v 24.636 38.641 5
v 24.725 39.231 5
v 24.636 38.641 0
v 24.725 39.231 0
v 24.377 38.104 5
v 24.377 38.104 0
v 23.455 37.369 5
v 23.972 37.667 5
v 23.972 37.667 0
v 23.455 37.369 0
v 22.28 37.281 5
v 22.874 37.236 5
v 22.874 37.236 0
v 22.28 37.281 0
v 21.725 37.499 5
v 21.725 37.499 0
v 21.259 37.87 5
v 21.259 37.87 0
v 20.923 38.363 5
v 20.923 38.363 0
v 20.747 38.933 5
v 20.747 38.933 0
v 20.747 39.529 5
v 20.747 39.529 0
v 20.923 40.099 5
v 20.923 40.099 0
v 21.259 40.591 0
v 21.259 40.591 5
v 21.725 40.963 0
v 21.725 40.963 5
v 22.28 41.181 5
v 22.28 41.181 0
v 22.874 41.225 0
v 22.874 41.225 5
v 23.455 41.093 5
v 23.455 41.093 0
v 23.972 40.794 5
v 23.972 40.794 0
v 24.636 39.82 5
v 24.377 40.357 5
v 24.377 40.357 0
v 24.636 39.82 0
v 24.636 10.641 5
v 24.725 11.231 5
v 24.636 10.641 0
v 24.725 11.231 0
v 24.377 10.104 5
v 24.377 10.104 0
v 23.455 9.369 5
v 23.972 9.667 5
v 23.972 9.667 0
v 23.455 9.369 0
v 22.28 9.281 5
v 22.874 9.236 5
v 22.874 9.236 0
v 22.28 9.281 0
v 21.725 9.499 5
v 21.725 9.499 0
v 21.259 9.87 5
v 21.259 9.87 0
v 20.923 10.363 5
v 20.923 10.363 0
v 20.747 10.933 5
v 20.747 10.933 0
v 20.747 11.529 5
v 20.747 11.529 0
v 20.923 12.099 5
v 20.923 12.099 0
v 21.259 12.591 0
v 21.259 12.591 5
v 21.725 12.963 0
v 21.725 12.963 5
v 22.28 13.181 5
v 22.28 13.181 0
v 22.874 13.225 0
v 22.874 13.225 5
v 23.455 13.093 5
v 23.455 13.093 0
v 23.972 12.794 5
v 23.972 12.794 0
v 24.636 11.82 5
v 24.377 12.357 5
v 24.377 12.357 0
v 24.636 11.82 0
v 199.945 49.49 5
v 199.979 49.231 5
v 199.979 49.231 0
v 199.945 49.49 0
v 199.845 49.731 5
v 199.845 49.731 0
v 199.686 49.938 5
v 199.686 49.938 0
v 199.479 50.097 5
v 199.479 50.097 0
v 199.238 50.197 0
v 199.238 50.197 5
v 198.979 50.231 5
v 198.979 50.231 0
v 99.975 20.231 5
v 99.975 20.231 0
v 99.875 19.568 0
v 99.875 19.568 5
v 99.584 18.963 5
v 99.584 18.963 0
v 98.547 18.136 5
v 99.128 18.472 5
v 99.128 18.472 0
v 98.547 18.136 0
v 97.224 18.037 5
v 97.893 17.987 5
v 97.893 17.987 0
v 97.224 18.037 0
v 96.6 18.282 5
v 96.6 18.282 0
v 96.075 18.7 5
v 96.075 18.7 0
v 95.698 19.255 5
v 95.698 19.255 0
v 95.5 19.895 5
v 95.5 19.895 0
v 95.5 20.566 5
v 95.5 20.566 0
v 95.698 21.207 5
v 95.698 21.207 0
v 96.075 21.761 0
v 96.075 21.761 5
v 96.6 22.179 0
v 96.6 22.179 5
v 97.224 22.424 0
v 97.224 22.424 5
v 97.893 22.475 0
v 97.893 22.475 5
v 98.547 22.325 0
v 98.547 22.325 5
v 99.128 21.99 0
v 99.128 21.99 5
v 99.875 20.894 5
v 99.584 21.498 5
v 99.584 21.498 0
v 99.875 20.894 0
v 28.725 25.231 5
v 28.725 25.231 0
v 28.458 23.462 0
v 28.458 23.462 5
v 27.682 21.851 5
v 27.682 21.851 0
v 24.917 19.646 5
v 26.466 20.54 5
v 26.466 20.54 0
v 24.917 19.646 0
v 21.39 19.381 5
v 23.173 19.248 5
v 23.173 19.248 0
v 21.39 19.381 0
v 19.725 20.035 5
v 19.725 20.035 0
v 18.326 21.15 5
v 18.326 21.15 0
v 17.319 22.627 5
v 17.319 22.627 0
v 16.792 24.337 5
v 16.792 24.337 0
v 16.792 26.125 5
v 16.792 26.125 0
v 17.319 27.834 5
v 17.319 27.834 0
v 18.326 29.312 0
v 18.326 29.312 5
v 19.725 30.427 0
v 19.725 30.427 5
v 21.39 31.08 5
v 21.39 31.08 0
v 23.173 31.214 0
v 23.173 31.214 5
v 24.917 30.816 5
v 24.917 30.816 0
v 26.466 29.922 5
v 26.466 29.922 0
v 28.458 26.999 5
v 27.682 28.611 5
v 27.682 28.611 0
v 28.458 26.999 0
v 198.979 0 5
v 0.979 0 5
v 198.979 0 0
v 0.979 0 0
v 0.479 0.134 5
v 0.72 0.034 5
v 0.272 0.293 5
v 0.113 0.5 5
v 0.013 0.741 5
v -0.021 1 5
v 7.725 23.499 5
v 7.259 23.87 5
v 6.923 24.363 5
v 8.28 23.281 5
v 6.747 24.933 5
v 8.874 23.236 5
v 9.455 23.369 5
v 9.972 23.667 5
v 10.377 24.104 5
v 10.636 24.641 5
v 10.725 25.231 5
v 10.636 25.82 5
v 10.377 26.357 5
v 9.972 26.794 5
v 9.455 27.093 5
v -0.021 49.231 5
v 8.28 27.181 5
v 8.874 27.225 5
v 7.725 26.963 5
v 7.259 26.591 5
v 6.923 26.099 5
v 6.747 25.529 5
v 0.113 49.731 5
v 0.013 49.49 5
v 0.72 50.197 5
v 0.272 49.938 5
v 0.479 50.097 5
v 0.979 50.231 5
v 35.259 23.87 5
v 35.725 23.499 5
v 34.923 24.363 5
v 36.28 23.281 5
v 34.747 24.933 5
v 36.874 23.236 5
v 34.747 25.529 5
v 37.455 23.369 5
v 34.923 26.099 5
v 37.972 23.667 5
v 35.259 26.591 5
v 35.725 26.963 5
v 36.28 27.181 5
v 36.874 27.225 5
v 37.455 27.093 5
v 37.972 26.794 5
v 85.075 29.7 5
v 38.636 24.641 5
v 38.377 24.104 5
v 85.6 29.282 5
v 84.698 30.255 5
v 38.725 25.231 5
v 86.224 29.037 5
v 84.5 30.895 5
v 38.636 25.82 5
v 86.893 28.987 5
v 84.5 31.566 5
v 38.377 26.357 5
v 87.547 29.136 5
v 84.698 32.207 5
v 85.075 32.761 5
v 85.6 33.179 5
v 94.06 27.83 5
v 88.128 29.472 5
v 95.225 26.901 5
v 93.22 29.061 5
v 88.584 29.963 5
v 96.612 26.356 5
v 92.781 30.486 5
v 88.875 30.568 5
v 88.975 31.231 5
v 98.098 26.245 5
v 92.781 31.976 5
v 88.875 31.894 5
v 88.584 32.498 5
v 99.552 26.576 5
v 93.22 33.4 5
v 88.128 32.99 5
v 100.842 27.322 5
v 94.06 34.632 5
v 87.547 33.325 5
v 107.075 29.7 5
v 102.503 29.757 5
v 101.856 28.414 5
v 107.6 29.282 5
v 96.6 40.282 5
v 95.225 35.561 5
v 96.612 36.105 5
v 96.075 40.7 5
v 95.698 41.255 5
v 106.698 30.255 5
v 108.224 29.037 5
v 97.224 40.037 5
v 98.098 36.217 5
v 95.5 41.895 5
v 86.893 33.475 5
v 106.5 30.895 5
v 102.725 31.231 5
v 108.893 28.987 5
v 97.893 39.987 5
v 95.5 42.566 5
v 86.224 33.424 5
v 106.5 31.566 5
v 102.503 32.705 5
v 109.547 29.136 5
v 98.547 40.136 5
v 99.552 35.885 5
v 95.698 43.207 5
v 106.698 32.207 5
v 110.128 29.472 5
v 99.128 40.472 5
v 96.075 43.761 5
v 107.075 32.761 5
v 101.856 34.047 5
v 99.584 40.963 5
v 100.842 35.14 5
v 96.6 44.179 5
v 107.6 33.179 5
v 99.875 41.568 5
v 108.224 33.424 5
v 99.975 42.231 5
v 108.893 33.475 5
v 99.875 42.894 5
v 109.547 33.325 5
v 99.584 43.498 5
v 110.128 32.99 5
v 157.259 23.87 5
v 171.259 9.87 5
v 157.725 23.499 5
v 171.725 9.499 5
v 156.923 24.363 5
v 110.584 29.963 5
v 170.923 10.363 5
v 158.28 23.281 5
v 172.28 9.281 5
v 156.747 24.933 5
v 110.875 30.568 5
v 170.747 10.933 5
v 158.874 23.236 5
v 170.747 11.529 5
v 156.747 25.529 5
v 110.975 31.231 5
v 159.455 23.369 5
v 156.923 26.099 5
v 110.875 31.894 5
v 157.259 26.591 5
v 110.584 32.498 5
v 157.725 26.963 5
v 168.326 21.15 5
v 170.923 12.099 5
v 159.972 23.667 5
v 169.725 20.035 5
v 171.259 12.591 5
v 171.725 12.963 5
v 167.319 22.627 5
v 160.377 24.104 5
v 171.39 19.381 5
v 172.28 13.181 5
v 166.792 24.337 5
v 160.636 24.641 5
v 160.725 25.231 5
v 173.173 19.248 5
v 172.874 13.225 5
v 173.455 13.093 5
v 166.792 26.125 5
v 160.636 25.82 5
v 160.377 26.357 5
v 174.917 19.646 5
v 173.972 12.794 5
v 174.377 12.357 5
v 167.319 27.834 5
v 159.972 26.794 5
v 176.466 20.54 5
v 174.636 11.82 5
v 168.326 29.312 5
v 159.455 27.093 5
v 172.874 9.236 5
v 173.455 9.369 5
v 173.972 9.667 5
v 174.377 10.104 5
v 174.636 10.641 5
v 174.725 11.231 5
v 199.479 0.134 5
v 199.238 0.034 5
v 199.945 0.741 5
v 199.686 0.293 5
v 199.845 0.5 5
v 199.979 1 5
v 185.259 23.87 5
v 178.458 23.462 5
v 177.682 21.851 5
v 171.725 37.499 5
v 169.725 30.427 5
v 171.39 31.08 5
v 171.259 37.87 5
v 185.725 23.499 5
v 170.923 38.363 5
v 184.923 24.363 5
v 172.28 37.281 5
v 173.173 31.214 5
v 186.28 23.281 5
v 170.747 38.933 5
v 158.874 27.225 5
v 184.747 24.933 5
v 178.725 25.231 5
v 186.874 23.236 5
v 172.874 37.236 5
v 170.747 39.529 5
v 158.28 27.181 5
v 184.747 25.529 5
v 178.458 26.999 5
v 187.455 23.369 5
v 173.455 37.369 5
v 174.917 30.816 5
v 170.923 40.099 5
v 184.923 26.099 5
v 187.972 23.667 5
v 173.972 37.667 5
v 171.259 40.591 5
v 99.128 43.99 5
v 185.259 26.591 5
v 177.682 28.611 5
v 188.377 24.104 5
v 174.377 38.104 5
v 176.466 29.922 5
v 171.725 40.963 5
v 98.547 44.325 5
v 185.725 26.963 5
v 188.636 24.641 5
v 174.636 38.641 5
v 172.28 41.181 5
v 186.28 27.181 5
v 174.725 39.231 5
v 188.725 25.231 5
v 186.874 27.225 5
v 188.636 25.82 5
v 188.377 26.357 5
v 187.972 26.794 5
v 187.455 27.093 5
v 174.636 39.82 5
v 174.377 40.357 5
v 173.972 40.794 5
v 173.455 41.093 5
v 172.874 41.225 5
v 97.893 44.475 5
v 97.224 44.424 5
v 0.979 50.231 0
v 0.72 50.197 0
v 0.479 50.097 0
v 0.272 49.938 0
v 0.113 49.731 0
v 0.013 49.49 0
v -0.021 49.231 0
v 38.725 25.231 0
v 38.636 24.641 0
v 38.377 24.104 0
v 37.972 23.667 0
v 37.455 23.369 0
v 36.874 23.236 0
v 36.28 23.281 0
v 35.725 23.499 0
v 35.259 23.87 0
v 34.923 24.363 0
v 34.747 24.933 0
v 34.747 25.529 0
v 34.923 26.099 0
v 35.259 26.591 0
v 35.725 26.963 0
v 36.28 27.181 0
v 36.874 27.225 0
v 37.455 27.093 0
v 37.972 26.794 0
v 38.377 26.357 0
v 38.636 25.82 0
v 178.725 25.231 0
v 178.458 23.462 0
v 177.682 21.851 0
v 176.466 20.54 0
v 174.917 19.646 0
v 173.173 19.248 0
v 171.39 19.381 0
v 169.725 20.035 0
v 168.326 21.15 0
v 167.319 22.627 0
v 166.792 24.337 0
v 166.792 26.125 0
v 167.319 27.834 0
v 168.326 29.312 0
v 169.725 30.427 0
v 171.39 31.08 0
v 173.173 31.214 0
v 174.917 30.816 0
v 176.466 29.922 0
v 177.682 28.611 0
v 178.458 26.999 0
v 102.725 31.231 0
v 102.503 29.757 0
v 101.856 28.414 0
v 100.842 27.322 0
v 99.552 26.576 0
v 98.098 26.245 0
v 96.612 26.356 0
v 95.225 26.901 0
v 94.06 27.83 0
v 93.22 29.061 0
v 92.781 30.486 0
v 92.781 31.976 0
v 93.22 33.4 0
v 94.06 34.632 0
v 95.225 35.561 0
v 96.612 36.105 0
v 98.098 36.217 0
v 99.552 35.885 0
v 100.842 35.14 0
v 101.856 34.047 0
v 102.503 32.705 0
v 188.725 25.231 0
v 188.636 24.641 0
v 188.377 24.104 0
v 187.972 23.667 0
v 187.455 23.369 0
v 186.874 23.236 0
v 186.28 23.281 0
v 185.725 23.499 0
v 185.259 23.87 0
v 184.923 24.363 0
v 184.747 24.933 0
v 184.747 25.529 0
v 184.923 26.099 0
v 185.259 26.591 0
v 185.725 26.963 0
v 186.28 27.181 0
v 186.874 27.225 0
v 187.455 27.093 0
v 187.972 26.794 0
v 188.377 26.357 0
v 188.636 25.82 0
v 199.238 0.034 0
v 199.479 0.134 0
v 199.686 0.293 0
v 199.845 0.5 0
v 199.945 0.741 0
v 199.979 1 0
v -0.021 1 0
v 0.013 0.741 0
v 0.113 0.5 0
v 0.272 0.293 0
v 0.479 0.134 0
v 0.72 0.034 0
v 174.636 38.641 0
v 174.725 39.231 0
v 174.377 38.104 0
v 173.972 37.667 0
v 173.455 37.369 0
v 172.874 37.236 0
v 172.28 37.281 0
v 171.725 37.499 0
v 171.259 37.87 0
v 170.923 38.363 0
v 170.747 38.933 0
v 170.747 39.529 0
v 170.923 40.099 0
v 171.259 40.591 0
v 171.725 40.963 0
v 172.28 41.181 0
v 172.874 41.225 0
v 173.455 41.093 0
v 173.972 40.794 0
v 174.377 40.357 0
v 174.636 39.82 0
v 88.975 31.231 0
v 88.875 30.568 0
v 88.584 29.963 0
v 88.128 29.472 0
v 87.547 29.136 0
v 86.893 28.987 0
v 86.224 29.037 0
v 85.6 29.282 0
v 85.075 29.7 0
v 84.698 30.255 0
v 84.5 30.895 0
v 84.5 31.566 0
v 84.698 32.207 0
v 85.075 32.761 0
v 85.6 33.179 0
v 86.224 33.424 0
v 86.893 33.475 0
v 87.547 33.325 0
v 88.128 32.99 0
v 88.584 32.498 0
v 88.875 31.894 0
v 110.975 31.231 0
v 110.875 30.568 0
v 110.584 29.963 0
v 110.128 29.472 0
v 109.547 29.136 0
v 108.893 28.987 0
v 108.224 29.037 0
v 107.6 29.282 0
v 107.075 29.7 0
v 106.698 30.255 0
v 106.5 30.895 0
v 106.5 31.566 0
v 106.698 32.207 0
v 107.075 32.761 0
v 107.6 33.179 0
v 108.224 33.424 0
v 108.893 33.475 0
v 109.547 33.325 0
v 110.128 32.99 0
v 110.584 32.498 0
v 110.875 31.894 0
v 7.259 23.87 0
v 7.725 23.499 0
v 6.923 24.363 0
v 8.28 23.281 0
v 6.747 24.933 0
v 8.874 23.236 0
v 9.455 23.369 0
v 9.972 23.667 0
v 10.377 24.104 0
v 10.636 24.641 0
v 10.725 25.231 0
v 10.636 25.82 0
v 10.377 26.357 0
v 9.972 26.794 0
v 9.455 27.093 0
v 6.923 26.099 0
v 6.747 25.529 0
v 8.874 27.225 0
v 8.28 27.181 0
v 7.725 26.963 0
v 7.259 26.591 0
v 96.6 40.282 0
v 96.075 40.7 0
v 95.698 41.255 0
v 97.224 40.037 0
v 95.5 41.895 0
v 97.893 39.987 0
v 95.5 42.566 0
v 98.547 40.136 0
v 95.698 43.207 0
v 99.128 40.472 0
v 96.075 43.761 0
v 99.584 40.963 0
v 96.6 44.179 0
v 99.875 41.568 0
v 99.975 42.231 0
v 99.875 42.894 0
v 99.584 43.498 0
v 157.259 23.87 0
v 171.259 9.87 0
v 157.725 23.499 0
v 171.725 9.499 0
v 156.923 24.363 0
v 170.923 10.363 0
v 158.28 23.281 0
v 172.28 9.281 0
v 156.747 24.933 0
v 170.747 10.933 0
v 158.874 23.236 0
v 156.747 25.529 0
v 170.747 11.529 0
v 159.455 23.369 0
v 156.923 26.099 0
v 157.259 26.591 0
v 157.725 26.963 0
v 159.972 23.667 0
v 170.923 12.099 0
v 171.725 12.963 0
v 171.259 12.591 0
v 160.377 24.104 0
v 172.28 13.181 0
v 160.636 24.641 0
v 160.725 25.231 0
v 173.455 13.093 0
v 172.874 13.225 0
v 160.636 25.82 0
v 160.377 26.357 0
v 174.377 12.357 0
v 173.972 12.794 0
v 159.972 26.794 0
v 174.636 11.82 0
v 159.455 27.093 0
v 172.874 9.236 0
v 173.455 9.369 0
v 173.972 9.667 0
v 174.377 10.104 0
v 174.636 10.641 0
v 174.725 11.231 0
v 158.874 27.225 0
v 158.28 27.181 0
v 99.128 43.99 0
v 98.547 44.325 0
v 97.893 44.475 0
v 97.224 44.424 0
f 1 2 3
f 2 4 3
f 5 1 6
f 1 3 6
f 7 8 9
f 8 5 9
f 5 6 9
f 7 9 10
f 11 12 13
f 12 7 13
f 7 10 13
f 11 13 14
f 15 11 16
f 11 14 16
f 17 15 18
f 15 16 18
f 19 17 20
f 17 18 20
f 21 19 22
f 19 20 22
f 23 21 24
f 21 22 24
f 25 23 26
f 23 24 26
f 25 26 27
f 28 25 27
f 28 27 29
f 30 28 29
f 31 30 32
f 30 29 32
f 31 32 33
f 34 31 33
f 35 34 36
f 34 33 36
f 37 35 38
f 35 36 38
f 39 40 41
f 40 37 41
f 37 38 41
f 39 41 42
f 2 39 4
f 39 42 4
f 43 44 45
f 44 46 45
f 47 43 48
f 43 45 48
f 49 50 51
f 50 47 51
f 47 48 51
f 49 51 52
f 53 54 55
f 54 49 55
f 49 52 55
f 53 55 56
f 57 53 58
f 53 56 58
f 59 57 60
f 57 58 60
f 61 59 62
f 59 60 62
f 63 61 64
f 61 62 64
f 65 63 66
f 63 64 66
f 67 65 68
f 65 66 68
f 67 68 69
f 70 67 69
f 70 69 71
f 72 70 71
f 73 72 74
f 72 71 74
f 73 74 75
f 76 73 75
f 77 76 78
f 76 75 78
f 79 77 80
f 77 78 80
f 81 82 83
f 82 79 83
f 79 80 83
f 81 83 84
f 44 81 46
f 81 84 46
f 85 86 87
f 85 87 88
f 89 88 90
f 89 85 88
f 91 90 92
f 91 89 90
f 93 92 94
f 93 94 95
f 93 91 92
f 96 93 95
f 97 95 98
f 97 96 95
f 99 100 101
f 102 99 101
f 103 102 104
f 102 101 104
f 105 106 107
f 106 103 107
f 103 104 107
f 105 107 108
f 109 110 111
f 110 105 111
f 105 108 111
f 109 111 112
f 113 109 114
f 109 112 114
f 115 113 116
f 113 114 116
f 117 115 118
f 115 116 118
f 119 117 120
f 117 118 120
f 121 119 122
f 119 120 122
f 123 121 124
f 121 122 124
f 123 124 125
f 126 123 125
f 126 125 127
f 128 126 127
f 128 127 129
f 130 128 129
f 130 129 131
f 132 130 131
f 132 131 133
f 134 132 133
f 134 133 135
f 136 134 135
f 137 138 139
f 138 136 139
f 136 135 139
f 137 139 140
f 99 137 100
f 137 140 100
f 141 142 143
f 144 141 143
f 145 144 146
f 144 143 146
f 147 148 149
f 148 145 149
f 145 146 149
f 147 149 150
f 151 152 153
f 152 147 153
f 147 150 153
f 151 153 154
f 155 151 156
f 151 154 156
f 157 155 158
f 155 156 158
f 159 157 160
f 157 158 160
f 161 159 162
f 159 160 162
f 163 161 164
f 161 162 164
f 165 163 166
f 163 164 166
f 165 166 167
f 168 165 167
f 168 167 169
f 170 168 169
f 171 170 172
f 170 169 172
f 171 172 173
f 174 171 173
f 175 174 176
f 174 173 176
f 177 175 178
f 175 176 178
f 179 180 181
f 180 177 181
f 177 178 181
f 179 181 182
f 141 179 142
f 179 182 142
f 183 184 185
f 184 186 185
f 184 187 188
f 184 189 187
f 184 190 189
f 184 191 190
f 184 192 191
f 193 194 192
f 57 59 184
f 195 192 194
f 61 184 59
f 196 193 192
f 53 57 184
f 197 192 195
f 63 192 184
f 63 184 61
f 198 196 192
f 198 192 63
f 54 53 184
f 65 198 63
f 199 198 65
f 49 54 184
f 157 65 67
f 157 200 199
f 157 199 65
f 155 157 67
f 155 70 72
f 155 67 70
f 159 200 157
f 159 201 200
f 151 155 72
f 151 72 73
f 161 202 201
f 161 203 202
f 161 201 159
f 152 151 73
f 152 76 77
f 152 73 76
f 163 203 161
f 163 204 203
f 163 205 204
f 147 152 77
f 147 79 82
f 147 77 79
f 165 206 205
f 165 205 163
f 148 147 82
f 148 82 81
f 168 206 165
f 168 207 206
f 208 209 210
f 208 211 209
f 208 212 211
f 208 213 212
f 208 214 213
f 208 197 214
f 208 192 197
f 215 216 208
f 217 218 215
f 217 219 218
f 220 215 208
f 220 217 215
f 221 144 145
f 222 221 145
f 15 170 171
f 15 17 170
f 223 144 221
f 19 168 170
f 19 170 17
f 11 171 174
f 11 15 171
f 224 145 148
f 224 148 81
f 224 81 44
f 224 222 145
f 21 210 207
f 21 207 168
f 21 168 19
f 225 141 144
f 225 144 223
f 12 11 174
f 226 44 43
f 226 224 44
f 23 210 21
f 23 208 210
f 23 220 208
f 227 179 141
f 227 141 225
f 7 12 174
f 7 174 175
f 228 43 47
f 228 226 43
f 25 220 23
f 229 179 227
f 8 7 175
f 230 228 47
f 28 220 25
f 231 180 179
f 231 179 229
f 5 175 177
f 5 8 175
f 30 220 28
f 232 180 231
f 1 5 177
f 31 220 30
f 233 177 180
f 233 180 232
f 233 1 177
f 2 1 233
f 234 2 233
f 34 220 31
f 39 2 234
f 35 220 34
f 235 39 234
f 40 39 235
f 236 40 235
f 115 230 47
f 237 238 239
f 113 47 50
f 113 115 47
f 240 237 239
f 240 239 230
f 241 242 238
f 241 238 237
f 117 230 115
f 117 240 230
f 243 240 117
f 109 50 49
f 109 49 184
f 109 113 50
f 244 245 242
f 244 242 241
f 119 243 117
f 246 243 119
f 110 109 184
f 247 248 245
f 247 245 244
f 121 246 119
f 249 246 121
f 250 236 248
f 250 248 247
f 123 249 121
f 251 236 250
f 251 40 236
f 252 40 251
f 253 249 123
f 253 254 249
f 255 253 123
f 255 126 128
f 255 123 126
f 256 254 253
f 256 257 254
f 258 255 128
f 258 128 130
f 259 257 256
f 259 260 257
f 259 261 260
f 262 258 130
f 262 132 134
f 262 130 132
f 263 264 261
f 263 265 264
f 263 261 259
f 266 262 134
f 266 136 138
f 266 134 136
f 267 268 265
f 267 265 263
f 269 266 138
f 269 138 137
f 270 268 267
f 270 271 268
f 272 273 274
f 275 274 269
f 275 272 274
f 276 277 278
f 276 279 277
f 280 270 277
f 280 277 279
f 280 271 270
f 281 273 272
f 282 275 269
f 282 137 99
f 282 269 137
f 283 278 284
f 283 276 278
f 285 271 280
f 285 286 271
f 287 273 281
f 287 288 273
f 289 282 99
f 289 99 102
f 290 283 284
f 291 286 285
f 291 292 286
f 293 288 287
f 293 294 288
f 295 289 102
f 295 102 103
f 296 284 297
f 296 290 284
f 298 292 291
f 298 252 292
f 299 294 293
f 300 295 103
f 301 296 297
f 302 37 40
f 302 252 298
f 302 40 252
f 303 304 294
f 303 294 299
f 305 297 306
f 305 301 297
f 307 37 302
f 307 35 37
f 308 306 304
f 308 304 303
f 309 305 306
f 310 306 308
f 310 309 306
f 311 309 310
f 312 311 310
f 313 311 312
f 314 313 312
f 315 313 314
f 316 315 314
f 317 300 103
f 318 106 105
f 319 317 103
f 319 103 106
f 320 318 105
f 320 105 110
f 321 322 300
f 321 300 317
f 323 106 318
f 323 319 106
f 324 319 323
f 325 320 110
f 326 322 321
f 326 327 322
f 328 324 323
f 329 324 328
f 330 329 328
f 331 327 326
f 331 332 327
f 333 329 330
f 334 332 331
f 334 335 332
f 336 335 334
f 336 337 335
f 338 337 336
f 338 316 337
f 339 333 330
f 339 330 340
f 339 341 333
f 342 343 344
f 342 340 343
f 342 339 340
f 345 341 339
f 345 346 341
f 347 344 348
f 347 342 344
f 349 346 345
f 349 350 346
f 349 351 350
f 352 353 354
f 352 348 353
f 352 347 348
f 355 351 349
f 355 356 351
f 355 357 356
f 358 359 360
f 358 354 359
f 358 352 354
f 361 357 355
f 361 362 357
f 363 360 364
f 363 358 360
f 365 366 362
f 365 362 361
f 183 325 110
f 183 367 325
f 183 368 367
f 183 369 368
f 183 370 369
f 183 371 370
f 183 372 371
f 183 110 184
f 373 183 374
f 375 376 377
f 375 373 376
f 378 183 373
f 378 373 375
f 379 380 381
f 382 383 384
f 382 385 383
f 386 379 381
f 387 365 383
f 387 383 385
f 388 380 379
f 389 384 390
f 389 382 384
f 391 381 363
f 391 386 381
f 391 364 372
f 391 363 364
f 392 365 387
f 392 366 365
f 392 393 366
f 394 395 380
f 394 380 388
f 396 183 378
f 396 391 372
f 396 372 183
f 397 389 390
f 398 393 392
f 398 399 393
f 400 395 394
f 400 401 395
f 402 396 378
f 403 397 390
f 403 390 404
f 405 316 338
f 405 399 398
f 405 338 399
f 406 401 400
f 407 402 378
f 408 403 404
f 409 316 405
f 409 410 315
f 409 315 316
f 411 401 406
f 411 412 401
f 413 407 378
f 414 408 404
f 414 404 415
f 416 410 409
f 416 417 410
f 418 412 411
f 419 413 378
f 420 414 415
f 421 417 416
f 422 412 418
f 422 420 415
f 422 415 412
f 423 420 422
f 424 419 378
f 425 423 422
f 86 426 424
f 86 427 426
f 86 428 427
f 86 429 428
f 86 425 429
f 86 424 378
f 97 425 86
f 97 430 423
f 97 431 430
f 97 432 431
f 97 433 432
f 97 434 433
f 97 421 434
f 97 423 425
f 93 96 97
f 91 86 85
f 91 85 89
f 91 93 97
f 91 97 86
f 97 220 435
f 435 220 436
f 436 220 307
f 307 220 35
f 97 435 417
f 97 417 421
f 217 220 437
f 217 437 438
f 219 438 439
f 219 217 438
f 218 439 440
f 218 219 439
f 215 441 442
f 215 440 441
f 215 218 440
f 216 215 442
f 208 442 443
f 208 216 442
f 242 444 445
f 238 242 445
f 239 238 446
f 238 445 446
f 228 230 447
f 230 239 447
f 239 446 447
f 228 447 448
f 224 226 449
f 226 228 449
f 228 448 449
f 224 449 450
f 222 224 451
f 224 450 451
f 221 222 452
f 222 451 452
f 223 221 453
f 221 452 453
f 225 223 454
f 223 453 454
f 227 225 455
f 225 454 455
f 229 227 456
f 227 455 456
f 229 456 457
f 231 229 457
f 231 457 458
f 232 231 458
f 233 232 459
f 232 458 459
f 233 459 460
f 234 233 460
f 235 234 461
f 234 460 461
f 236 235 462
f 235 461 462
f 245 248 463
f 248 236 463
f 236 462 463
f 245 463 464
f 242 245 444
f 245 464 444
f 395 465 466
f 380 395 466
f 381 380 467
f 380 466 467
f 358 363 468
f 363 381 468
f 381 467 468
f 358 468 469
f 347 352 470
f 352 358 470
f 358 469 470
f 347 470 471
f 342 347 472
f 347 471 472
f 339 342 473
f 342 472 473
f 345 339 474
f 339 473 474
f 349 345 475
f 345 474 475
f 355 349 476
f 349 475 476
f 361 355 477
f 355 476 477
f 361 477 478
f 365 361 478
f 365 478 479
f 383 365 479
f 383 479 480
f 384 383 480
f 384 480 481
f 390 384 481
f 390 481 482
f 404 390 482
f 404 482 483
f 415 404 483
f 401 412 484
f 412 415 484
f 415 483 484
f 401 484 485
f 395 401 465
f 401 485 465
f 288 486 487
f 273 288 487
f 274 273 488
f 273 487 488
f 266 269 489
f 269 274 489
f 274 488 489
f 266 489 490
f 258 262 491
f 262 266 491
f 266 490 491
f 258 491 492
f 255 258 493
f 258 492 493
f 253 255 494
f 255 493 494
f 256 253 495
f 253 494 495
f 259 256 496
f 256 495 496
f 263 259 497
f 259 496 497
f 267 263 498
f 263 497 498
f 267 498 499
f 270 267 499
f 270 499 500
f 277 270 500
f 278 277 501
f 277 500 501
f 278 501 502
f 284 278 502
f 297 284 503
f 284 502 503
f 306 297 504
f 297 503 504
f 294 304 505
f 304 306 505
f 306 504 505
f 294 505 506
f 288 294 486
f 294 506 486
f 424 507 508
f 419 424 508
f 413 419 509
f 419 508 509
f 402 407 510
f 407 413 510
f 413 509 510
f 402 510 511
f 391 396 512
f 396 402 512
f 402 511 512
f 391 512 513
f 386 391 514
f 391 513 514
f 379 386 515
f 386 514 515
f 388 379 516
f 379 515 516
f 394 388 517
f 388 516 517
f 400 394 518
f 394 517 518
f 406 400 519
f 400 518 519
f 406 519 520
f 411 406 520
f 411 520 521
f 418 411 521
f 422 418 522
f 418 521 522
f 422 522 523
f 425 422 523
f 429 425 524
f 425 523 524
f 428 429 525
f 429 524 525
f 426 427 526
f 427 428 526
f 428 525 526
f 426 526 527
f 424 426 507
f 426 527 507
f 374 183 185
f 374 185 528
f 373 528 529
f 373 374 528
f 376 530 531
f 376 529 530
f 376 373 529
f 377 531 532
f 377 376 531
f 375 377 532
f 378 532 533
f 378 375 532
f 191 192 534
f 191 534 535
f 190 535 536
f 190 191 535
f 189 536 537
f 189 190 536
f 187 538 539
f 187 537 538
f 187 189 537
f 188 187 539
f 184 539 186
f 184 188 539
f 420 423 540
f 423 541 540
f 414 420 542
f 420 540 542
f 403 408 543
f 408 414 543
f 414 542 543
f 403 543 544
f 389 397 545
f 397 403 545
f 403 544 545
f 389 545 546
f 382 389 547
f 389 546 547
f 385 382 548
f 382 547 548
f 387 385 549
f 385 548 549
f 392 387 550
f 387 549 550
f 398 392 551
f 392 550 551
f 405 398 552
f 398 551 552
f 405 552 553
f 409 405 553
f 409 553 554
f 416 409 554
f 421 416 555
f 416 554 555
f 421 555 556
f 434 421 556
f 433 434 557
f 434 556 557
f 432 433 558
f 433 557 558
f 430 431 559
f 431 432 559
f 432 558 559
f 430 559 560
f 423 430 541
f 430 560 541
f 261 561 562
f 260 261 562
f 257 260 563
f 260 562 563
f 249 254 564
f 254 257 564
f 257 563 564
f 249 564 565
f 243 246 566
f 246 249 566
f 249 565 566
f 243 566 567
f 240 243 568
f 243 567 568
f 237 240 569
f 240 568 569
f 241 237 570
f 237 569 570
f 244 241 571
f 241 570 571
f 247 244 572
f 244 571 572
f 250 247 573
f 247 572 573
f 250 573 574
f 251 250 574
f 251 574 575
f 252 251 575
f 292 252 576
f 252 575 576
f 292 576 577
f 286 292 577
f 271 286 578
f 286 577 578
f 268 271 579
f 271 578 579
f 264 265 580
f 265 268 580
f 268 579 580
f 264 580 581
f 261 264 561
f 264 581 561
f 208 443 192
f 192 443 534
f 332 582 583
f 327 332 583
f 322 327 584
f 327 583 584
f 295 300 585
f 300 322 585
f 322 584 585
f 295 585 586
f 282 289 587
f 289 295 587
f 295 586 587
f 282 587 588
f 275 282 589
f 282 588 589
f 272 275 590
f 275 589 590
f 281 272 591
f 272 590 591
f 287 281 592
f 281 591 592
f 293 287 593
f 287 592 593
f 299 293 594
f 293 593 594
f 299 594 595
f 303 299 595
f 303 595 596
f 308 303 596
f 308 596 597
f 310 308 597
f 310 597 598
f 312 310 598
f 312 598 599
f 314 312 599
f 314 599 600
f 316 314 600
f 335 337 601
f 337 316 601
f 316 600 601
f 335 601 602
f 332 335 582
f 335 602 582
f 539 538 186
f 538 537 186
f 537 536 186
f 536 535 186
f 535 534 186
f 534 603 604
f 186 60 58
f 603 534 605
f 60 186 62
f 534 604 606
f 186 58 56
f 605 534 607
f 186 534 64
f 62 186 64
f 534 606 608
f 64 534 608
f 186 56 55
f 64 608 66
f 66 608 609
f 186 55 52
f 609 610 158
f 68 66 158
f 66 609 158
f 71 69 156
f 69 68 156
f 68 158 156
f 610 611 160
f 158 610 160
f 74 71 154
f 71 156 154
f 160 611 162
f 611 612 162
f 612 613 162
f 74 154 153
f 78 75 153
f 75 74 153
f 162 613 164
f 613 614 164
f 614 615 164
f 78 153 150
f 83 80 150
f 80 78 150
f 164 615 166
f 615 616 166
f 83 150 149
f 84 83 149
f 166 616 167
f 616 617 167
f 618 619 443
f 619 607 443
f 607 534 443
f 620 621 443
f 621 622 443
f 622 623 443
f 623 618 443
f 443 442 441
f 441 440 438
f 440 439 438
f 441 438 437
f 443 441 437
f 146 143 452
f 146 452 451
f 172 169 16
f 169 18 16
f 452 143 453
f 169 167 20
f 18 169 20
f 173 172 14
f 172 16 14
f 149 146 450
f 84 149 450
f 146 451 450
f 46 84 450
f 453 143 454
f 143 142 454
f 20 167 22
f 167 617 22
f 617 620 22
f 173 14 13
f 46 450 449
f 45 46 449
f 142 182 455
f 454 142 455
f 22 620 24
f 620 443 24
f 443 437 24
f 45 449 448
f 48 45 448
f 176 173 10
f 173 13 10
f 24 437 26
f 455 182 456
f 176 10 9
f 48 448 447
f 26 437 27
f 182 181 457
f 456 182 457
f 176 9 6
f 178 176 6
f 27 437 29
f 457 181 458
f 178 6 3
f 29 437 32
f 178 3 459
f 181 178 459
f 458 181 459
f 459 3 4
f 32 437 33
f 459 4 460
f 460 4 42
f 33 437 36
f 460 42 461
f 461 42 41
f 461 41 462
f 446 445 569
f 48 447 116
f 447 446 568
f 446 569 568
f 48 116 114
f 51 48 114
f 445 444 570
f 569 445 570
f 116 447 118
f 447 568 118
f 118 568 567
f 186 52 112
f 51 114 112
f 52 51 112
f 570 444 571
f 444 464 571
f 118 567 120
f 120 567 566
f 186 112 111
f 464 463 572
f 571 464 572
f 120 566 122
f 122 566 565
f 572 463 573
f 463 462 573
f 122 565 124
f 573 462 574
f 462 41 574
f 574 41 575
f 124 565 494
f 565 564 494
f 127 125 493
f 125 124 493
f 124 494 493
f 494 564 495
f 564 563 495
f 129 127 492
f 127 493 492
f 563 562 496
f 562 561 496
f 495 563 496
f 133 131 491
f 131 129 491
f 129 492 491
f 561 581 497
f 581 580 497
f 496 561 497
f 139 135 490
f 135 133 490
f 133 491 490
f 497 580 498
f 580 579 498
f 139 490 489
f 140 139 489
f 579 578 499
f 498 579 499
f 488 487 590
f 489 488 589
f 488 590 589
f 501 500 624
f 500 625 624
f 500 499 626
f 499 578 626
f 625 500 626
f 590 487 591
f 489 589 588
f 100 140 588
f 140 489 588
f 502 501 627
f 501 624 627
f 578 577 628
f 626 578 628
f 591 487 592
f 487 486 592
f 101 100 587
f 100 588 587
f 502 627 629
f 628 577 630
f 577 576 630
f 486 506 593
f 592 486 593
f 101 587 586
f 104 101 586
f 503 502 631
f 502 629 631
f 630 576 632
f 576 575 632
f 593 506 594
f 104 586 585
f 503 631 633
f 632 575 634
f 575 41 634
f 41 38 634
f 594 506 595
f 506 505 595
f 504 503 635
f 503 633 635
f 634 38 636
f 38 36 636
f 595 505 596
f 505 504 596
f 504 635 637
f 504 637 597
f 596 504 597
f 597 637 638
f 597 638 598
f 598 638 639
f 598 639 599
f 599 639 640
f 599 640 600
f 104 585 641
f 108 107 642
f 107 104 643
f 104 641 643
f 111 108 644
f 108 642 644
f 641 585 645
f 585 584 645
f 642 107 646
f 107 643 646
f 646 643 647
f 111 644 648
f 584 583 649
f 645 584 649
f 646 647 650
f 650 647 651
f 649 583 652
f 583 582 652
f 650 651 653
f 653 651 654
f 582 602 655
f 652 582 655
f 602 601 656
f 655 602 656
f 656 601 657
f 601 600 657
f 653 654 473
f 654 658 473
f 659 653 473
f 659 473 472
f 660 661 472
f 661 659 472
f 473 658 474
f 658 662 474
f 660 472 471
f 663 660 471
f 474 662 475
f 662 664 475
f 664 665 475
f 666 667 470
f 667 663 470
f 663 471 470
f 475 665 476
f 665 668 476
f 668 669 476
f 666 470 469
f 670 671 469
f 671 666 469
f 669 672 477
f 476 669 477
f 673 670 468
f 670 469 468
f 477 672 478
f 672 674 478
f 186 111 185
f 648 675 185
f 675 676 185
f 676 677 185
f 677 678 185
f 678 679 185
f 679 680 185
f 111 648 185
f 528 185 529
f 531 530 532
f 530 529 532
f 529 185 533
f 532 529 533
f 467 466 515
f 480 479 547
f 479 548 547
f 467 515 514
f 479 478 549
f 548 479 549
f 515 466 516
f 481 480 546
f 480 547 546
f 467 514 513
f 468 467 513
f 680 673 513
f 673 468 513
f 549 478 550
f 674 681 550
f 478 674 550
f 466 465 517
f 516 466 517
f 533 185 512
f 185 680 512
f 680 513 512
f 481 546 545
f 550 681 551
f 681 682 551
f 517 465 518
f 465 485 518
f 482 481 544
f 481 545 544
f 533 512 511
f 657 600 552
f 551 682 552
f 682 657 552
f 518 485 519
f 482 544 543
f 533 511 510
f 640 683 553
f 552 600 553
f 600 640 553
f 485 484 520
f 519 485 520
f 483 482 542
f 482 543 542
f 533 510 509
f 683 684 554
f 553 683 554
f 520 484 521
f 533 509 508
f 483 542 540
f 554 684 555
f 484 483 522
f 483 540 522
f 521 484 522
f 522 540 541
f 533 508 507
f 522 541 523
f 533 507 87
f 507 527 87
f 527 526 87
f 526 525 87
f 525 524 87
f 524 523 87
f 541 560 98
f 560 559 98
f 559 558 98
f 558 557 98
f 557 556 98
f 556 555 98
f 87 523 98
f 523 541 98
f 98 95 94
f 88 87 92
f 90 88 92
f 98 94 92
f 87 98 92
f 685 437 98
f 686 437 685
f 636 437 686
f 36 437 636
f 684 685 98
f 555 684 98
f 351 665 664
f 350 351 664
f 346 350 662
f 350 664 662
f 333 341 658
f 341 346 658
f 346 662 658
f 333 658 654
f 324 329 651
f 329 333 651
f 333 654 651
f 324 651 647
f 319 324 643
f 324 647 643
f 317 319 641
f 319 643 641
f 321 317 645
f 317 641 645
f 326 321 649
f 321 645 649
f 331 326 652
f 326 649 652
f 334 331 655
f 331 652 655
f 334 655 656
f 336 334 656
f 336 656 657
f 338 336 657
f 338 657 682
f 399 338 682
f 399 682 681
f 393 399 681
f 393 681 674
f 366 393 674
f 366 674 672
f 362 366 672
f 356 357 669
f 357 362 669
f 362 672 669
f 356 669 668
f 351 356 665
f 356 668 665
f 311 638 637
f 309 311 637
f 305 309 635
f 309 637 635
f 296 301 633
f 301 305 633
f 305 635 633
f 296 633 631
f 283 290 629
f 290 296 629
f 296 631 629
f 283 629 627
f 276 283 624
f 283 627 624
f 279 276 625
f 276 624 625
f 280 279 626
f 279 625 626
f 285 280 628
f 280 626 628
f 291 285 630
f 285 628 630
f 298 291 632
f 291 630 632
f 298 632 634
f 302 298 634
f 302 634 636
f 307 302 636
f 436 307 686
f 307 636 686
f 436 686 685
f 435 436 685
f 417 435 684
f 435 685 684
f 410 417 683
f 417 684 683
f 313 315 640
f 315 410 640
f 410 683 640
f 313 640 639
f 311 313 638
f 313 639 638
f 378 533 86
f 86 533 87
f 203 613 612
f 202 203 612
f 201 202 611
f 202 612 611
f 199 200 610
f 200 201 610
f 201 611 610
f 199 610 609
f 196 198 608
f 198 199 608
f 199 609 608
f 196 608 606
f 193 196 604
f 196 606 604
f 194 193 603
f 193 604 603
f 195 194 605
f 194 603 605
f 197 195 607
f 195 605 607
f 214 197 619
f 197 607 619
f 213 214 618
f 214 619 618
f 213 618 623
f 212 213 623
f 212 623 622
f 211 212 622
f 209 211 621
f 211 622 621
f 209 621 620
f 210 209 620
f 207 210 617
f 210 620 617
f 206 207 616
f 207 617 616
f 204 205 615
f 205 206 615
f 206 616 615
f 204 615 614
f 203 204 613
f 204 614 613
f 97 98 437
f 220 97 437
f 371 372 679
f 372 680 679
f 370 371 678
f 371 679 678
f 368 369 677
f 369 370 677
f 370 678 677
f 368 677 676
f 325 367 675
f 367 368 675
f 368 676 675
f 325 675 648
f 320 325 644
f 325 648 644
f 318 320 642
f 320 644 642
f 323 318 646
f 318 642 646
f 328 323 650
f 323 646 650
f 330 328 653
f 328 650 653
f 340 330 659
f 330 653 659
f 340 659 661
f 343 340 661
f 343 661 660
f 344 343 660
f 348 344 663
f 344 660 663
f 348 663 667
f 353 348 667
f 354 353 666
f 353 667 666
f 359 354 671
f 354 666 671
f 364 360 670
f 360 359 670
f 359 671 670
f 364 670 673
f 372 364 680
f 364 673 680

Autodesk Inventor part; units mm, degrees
ref_plane "YZ Plane" through (0, 0, 0) normal (1, 0, 0) x (0, 1, 0)
ref_plane "XZ Plane" through (0, 0, 0) normal (0, 1, 0) x (-1, 0, 0)
ref_plane "XY Plane" through (0, 0, 0) normal (0, 0, 1) x (1, 0, 0)
sketch "Sketch1" plane through (0, 0, 0) normal (0, 0, 1) x (1, 0, 0)
  line L0 (199.9787, 50.2308) -> (-0.0213, 50.2308)
  circle A0 centre (172.7248, 39.2308) radius 2
  circle A1 centre (158.7248, 25.2308) radius 2
  circle A2 centre (172.7248, 11.2308) radius 2
  circle A3 centre (186.7248, 25.2308) radius 2
  circle A4 centre (22.7248, 39.2308) radius 2
  circle A5 centre (8.7248, 25.2308) radius 2
  circle A6 centre (22.7248, 11.2308) radius 2
  circle A7 centre (36.7248, 25.2308) radius 2
  circle A8 centre (97.7248, 31.2308) radius 5
  circle A9 centre (172.7248, 25.2308) radius 6
  circle A10 centre (22.7248, 25.2308) radius 6
  circle A11 centre (97.7248, 20.2308) radius 2.25
  circle A12 centre (86.7248, 31.2308) radius 2.25
  circle A13 centre (108.7248, 31.2308) radius 2.25
  circle A14 centre (97.7248, 42.2308) radius 2.25
  line L1 (-0.0213, 50.2308) -> (-0.0213, 0)
  line L2 (-0.0213, 0) -> (199.9787, 0)
  line L3 (199.9787, 0) -> (199.9787, 50.2308)
  point P0 (0, 0)
extrude "Extrusion1" add sketch "Sketch1" along normal blind 5
fillet "Fillet1" radius 1 1 edges at (199.9787, 50.2308, 2.5)
fillet "Fillet2" radius 1 1 edges at (199.9787, 0, 2.5)
fillet "Fillet3" radius 1 1 edges at (-0.0213, 0, 2.5)
fillet "Fillet4" radius 1 1 edges at (-0.0213, 50.2308, 2.5)
properties part number "print bed test strut"
